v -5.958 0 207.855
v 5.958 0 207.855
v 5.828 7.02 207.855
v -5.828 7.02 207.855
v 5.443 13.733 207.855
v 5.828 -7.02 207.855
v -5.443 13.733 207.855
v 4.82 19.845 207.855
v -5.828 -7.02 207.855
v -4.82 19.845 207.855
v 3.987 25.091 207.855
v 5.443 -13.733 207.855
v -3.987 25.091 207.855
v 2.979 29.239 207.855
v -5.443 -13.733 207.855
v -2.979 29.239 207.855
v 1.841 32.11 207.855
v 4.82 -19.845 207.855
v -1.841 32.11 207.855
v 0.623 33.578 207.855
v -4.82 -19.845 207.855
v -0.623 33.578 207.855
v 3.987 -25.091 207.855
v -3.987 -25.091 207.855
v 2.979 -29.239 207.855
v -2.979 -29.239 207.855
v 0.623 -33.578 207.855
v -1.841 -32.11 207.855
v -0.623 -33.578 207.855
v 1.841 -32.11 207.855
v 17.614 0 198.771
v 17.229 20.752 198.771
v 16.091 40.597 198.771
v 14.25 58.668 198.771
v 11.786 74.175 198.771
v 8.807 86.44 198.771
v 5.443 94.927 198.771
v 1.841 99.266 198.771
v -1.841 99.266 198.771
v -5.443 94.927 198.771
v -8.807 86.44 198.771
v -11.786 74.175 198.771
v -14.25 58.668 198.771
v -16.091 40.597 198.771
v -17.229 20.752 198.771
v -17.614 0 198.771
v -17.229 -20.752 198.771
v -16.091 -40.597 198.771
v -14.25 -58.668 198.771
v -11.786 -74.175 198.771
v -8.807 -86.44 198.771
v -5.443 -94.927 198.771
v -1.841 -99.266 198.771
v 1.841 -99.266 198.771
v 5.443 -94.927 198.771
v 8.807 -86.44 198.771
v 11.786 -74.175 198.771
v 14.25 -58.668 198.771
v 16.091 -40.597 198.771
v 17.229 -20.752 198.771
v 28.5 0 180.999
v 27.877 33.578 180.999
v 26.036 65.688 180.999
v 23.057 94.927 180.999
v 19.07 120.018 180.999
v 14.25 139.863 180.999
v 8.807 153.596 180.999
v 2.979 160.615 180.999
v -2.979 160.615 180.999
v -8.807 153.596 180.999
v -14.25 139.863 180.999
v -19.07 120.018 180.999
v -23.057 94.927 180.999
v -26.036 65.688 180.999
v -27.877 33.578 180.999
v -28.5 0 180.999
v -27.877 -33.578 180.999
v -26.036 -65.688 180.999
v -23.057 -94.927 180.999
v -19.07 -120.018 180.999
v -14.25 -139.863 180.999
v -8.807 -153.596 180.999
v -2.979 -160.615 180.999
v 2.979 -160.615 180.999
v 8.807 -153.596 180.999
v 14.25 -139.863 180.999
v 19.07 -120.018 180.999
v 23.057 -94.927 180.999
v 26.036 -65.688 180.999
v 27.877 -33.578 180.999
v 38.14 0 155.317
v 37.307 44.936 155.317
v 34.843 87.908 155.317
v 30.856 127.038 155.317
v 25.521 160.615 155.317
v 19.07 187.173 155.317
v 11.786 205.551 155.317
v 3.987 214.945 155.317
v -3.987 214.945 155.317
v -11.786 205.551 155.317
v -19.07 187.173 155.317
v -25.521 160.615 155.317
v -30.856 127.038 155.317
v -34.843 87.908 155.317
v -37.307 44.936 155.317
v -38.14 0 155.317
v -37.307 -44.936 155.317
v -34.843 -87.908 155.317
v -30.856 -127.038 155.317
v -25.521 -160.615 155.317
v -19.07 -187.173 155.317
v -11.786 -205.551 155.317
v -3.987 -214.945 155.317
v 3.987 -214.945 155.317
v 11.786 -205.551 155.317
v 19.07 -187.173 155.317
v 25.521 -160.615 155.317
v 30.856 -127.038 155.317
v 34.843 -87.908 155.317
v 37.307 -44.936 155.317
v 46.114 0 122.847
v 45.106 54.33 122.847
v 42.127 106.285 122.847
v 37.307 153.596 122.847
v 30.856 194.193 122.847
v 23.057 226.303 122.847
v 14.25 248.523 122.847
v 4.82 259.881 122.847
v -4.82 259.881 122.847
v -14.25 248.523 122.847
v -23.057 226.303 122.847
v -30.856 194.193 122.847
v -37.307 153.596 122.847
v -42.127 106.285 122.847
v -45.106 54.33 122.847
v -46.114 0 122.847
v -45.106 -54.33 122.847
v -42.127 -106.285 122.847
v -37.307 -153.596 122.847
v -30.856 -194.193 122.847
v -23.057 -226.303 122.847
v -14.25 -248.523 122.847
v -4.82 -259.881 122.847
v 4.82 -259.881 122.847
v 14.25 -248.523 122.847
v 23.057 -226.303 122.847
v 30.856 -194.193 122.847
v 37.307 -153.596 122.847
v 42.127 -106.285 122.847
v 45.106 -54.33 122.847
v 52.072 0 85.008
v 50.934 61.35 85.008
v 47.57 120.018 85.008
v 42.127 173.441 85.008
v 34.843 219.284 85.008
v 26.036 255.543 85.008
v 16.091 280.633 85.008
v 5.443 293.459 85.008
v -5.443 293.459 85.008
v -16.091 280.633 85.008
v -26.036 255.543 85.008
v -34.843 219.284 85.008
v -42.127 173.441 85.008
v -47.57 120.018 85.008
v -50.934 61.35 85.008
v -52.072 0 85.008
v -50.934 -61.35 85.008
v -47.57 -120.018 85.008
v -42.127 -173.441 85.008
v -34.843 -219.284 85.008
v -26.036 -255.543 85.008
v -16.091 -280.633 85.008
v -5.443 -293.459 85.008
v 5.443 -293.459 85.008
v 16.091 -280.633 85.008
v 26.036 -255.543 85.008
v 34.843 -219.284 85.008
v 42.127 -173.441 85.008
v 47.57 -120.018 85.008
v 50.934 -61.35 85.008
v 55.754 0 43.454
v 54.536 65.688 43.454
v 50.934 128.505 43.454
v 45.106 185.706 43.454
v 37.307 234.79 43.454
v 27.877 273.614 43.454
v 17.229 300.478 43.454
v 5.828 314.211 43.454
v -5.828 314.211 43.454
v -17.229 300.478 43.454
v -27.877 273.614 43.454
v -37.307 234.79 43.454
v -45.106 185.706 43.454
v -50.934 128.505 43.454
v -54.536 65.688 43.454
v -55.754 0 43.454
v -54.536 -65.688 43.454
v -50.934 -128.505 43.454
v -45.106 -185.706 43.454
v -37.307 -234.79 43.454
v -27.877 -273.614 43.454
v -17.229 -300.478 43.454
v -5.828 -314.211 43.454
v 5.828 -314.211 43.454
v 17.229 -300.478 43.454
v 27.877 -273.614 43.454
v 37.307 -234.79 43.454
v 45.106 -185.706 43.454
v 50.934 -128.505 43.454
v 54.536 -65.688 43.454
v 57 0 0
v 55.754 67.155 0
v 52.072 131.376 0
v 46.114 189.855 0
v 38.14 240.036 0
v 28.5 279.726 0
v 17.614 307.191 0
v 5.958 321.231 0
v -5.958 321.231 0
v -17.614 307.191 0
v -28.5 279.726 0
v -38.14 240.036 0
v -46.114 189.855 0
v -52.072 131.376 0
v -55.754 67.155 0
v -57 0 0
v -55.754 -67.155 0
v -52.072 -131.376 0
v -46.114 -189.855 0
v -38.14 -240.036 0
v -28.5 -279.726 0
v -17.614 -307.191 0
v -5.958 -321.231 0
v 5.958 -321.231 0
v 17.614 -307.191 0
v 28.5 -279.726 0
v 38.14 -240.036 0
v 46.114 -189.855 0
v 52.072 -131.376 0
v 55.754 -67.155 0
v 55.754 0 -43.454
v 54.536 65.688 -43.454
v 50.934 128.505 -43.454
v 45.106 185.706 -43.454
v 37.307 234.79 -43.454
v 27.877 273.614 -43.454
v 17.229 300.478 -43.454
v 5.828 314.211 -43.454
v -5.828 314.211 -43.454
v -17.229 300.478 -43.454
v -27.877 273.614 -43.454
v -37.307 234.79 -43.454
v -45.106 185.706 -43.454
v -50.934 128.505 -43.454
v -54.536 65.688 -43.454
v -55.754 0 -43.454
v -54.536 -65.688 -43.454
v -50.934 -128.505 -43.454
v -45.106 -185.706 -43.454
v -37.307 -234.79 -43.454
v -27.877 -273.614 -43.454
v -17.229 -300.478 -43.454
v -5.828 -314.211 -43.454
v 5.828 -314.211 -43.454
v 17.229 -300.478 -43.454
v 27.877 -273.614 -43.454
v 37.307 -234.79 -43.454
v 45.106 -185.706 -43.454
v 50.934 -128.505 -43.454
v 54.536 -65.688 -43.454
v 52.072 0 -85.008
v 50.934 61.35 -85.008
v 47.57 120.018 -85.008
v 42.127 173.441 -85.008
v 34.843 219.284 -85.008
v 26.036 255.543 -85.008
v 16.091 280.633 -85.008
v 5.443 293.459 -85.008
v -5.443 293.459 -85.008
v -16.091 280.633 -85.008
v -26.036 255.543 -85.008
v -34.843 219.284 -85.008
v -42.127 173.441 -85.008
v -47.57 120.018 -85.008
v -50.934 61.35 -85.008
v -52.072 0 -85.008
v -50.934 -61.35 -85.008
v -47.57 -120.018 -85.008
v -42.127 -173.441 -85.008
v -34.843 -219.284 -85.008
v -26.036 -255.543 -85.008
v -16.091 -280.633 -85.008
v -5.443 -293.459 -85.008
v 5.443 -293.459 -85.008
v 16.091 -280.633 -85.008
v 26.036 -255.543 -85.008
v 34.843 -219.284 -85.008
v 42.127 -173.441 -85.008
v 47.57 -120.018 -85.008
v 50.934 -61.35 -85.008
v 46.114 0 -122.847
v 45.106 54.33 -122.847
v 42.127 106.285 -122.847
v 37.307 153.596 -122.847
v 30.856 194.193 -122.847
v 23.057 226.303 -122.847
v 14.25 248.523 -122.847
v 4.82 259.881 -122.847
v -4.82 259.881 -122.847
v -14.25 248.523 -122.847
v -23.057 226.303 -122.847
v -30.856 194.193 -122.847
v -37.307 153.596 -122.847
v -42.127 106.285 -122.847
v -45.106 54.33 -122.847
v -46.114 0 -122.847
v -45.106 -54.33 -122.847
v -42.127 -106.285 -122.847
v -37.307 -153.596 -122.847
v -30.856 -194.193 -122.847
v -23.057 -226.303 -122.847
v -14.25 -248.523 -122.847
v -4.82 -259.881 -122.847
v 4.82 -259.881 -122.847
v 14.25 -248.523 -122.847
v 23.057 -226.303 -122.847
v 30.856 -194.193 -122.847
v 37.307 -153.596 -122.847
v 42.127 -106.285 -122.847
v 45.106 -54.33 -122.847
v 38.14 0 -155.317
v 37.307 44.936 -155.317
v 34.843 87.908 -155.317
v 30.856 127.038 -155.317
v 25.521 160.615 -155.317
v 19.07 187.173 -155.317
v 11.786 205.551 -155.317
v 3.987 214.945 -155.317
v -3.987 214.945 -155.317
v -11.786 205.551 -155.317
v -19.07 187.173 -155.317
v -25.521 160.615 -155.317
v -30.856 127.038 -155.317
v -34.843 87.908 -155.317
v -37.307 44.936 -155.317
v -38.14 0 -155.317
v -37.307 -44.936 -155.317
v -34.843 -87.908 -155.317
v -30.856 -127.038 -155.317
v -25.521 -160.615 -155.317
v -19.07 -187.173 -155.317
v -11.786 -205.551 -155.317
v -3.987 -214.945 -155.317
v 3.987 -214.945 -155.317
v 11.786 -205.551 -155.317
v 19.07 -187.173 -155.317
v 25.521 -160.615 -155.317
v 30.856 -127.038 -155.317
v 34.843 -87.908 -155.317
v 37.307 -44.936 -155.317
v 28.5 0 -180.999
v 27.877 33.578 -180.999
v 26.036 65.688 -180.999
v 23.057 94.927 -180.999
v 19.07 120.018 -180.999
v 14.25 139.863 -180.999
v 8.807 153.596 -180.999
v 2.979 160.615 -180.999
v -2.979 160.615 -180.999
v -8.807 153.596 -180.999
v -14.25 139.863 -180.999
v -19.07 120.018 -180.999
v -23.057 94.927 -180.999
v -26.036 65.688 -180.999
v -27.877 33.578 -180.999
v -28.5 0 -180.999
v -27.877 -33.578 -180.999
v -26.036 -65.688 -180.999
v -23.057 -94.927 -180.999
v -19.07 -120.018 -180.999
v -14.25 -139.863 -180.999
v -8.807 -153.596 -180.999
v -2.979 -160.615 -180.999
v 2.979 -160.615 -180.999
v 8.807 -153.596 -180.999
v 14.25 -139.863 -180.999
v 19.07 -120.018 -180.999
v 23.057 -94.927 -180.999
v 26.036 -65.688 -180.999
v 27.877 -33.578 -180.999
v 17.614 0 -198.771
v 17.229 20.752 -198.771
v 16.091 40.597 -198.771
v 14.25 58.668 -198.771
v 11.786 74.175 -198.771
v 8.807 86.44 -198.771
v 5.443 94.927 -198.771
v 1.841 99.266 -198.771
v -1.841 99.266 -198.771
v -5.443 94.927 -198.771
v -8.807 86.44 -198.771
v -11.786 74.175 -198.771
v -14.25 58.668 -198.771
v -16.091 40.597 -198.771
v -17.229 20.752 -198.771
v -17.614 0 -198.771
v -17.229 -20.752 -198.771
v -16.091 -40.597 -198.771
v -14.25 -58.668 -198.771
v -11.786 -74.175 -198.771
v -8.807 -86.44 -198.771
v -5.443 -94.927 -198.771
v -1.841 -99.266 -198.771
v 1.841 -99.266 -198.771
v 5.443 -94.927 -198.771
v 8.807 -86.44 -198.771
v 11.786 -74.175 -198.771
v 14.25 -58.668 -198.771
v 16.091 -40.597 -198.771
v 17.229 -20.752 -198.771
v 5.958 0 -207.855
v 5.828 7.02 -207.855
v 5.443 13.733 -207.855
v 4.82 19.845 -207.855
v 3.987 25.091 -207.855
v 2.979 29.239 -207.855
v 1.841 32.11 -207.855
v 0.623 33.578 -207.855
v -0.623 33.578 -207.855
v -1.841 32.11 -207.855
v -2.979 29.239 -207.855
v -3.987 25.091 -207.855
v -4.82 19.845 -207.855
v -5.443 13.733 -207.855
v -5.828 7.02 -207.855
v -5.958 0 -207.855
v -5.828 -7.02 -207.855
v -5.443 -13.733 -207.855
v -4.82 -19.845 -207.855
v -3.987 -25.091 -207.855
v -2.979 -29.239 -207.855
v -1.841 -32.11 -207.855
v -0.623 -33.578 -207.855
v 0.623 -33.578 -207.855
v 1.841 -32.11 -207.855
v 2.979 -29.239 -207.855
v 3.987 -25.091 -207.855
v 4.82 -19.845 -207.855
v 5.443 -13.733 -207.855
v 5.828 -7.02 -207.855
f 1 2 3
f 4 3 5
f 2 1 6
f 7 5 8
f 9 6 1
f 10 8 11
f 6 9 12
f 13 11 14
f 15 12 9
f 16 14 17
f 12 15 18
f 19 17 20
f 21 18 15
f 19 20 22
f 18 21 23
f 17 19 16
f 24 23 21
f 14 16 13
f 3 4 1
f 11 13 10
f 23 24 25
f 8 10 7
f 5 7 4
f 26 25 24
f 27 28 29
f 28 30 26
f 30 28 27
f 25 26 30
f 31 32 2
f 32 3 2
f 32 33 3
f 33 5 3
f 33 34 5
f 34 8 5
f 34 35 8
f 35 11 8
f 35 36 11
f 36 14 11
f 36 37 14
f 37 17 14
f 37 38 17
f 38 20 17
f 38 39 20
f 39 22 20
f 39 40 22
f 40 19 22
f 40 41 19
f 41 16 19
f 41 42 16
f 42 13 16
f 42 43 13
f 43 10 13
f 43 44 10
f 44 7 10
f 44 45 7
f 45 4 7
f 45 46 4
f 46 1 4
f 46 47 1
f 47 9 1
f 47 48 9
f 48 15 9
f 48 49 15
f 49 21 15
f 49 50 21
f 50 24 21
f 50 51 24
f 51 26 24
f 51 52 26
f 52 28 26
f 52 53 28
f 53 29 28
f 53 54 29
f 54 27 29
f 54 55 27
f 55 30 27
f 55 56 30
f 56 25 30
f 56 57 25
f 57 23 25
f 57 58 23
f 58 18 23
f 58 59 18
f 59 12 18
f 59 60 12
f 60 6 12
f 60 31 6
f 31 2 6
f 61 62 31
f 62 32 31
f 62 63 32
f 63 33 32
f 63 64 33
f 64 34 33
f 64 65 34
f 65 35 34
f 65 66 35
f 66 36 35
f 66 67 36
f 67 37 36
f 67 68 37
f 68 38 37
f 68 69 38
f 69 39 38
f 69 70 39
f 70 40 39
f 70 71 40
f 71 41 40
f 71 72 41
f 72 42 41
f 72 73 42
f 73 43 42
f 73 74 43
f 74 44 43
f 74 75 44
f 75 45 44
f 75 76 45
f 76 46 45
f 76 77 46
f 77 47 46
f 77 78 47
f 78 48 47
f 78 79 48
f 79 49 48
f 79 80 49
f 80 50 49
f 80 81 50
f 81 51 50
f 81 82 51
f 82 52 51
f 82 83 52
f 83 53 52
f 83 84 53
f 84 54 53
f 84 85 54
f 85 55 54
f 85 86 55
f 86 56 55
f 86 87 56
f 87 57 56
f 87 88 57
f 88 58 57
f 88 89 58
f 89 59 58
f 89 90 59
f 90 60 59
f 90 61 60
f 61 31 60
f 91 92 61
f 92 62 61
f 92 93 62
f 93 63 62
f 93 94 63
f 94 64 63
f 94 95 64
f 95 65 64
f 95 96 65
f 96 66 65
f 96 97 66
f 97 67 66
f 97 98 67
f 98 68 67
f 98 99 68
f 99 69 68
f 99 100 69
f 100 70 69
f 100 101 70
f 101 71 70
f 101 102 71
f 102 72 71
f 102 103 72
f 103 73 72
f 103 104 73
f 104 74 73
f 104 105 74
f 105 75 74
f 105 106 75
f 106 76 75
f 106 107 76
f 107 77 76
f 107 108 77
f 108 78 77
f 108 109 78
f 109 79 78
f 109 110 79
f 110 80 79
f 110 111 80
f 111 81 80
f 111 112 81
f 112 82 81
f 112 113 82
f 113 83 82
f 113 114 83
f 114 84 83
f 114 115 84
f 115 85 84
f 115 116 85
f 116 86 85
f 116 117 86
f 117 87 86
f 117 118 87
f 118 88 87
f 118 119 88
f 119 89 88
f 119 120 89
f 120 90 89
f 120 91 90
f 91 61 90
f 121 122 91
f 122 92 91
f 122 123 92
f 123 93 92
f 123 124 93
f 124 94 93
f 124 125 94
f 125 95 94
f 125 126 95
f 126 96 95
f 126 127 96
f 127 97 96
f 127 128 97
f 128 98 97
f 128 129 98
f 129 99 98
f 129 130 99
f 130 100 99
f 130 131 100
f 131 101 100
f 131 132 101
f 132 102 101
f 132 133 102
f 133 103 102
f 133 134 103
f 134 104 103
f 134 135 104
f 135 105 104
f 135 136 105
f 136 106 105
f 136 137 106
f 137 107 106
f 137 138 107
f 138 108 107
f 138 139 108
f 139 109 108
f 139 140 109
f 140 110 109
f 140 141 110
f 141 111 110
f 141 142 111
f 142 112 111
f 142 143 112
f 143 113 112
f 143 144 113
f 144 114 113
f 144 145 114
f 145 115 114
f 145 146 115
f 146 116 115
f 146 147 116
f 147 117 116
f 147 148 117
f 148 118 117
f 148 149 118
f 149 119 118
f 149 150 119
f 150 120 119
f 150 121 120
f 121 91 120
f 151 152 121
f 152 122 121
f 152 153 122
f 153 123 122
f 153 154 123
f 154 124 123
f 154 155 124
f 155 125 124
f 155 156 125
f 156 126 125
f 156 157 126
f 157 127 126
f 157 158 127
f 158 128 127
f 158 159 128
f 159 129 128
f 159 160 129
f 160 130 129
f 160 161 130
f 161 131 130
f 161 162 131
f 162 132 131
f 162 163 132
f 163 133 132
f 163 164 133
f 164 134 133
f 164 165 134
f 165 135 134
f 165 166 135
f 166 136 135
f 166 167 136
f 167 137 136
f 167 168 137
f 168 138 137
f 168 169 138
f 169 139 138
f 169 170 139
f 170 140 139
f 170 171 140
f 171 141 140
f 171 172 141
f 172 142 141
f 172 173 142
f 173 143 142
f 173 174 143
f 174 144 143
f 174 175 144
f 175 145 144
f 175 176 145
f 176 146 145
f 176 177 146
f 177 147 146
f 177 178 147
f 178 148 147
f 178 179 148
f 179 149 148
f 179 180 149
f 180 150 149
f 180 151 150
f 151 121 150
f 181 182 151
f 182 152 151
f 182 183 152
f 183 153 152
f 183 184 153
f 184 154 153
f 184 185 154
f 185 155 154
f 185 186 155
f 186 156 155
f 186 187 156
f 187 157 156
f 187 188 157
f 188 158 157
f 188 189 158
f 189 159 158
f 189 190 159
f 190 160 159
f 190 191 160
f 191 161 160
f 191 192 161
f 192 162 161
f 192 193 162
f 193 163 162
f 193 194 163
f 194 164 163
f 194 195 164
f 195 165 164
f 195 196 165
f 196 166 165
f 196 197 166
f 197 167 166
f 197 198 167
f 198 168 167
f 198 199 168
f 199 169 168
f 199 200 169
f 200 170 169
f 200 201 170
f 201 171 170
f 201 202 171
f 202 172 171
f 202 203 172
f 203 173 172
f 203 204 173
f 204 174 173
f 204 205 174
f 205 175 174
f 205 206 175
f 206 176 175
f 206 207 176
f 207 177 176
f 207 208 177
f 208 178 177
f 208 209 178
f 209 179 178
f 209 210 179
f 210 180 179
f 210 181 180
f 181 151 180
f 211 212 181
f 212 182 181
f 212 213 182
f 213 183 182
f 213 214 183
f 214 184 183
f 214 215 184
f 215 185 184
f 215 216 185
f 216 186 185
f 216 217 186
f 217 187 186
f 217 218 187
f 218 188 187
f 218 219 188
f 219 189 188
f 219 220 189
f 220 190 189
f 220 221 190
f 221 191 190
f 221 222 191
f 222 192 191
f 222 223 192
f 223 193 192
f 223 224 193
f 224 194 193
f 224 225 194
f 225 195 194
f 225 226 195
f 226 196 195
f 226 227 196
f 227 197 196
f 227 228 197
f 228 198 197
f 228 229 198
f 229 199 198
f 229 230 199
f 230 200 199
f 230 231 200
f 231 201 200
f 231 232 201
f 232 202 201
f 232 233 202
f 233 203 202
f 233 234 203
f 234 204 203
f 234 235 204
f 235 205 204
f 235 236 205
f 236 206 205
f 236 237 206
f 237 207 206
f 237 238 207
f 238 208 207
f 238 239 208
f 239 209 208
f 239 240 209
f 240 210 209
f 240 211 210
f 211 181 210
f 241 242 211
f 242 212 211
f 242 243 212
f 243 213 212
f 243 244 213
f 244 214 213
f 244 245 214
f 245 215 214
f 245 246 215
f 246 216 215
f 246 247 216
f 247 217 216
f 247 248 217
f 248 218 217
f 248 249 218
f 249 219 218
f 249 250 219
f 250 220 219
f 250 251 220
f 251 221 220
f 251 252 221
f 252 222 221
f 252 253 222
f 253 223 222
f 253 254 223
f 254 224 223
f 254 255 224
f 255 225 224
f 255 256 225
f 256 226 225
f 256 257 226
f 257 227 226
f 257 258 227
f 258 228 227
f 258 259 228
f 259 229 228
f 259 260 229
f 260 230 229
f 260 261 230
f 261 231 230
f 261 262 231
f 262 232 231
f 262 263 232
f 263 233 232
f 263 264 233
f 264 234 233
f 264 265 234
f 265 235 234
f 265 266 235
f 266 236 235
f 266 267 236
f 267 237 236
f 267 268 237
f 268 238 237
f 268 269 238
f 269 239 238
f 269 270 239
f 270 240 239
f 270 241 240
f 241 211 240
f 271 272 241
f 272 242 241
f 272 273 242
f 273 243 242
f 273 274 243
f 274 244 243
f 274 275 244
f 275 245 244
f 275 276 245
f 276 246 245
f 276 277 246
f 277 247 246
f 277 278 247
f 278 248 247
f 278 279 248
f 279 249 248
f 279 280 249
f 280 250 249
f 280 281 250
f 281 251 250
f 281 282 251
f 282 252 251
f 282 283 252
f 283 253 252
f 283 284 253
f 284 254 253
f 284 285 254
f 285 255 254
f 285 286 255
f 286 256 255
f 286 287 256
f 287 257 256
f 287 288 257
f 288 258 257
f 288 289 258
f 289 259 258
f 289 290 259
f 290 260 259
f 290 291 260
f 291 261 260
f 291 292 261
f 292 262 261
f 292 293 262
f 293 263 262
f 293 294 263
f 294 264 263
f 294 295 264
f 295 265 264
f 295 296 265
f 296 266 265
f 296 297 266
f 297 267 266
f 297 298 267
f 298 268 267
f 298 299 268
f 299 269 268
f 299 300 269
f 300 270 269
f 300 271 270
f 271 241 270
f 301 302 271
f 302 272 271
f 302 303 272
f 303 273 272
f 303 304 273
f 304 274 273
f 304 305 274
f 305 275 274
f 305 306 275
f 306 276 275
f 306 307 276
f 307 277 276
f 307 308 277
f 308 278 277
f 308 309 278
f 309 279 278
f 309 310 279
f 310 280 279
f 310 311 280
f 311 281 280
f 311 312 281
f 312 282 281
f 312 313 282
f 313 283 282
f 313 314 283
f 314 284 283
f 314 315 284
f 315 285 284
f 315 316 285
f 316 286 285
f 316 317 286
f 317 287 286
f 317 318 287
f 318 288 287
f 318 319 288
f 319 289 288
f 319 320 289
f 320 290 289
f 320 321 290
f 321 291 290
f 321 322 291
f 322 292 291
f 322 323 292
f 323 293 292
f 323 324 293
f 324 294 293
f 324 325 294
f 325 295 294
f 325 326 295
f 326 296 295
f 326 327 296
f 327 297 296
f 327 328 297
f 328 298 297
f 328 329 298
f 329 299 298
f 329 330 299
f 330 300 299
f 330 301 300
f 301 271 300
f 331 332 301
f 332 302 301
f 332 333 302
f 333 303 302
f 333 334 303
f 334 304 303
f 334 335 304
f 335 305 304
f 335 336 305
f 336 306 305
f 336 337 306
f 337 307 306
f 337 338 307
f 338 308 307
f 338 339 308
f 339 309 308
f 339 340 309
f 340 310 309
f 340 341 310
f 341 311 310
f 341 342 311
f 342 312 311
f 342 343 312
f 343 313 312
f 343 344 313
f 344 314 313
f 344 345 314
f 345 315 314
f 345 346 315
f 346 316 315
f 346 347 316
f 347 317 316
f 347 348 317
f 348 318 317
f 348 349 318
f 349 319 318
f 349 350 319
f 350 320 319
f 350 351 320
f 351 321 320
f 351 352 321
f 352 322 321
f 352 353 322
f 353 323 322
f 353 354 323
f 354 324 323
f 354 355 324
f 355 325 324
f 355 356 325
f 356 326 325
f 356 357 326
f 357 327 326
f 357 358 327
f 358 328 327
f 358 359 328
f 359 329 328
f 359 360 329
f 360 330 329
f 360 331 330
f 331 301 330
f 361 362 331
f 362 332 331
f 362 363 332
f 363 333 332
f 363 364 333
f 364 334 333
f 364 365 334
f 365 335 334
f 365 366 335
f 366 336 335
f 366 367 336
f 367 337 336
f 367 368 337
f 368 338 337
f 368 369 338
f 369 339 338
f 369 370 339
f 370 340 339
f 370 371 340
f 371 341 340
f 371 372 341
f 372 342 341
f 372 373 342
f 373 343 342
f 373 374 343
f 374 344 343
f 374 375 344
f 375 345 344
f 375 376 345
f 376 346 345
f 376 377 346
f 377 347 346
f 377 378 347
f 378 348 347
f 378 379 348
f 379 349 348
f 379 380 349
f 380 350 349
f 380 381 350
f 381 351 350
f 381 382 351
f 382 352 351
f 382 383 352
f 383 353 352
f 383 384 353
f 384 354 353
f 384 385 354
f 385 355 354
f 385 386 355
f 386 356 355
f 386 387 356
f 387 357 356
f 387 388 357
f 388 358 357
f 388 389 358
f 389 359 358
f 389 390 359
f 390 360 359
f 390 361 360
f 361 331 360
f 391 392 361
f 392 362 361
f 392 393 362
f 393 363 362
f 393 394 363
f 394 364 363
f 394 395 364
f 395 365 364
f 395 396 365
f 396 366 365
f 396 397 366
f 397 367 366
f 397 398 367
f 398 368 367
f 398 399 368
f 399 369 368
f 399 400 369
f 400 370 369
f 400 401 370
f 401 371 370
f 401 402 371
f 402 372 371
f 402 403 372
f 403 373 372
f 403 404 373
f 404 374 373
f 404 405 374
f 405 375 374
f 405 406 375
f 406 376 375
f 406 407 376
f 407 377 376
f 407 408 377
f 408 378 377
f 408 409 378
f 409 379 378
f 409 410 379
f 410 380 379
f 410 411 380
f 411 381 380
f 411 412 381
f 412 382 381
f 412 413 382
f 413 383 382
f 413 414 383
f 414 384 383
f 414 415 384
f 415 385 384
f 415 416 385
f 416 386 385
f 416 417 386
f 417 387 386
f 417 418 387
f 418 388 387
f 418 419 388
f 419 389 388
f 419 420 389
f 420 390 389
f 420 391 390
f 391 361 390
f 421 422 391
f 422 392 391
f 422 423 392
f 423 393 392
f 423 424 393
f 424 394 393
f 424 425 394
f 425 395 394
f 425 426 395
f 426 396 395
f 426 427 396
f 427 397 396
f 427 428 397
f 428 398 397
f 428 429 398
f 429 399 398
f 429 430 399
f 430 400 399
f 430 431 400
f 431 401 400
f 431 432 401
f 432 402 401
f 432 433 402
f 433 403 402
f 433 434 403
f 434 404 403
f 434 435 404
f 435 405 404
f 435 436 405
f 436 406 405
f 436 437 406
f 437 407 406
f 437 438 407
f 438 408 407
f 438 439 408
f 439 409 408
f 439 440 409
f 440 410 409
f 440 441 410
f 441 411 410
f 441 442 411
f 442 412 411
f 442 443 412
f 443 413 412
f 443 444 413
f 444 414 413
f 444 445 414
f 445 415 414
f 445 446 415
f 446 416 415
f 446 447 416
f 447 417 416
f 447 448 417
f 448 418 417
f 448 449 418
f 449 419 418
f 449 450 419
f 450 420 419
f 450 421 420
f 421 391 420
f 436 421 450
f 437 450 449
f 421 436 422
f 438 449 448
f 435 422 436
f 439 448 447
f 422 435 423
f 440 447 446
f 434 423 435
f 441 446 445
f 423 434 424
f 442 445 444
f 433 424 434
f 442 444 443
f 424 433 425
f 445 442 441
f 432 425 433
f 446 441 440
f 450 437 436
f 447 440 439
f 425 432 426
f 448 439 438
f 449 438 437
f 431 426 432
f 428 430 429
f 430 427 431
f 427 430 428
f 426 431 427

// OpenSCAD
// Generated by SolidPython 1.0.1 on 2020-07-29 00:46:46


scale(v = [3, 17, 11]) {
	sphere(r = 19);
}
/***********************************************
*********      SolidPython code:      **********
************************************************
 
# import packages: SolidPython
from solid import *
from solid.utils import *
from itertools import chain, combinations, permutations


class Resize:

    def __init__(self, scad_file):
        self.scad_file = scad_file
        #self.scad_file = import_scad(scad_file)
        # cone/cylinder param:
        self.r1 = 0
        self.r2 = 0
        self.h = 0
        # rectangular prism param:
        self.w = 0
        self.l = 0
        # ellipse param:
        self.r = 0

    # import OpenScad code (file name corresponds to shape)


    # classify shape + parameters
    def assign(self, param1, param2, param3):
        if self.scad_file == 'cone.scad':
            self.r1 = param1
            self.r2 = param2
            self.h = param3
        elif self.scad_file == 'cylinder.scad':
            self.r1 = param1
            self.r2 = param2
            self.h = param3
        elif self.scad_file == 'rectangularPrism.scad':
            self.h = param1
            self.l = param2
            self.w = param3
        else:
            self.r = param1
            self.h = param2

    # resize parameters
    def iterate(self):
        x = range(3, 20, 2)
        i = 1
        if self.scad_file == 'cone.scad':
            tempList = list(permutations(x, 2))
            for temp in tempList:
                param1 = temp[0]
                param2 = temp[1]
                filepath = 'produced_scad_files/' + 'cone' + str(param1) + '_' + str(param2) + '_' + '.scad'
                scad_render_to_file(cylinder(h=param1, r1=param2, r2=0), filepath)

        elif self.scad_file == 'cylinder.scad':
            tempList = list(permutations(x, 3))
            for temp in tempList:
                param1 = temp[0]
                param2 = temp[1]
                filepath = 'produced_scad_files/' + 'cylinder' + str(param1) + '_' + str(param2) + '_' + '.scad'
                scad_render_to_file(cylinder(h=param1, r1=param2, r2=param2), filepath)

        elif self.scad_file == 'rectangularPrism.scad':
            tempList = list(permutations(x, 3))
            for temp in tempList:
                param1 = temp[0]
                param2 = temp[1]
                param3 = temp[2]
                filepath = 'produced_scad_files/' + 'rectangularPrism' + str(param1) + '_' + str(param2) + '_' + str(
                    param3) + '.scad'
                scad_render_to_file(cube(size=(param1, param2, param3)), filepath)

        elif self.scad_file == 'ellipse.scad':
            tempList = list(permutations(x, 4))
            for temp in tempList:
                param1 = temp[0]
                param2 = temp[1]
                param3 = temp[2]
                param4 = temp[3]
                filepath = 'produced_scad_files/' + 'ellipse' + str(param1) + '_' + str(param2) + '_' + str(param3) + '_' + str(param4) + '.scad'
                scad_render_to_file(scale([param1, param2, param3])(sphere(r=param4)), filepath)

    def render_to_scadfile(self):
        scad_render_to_file(scad, 'example.scad') 
 
************************************************/
